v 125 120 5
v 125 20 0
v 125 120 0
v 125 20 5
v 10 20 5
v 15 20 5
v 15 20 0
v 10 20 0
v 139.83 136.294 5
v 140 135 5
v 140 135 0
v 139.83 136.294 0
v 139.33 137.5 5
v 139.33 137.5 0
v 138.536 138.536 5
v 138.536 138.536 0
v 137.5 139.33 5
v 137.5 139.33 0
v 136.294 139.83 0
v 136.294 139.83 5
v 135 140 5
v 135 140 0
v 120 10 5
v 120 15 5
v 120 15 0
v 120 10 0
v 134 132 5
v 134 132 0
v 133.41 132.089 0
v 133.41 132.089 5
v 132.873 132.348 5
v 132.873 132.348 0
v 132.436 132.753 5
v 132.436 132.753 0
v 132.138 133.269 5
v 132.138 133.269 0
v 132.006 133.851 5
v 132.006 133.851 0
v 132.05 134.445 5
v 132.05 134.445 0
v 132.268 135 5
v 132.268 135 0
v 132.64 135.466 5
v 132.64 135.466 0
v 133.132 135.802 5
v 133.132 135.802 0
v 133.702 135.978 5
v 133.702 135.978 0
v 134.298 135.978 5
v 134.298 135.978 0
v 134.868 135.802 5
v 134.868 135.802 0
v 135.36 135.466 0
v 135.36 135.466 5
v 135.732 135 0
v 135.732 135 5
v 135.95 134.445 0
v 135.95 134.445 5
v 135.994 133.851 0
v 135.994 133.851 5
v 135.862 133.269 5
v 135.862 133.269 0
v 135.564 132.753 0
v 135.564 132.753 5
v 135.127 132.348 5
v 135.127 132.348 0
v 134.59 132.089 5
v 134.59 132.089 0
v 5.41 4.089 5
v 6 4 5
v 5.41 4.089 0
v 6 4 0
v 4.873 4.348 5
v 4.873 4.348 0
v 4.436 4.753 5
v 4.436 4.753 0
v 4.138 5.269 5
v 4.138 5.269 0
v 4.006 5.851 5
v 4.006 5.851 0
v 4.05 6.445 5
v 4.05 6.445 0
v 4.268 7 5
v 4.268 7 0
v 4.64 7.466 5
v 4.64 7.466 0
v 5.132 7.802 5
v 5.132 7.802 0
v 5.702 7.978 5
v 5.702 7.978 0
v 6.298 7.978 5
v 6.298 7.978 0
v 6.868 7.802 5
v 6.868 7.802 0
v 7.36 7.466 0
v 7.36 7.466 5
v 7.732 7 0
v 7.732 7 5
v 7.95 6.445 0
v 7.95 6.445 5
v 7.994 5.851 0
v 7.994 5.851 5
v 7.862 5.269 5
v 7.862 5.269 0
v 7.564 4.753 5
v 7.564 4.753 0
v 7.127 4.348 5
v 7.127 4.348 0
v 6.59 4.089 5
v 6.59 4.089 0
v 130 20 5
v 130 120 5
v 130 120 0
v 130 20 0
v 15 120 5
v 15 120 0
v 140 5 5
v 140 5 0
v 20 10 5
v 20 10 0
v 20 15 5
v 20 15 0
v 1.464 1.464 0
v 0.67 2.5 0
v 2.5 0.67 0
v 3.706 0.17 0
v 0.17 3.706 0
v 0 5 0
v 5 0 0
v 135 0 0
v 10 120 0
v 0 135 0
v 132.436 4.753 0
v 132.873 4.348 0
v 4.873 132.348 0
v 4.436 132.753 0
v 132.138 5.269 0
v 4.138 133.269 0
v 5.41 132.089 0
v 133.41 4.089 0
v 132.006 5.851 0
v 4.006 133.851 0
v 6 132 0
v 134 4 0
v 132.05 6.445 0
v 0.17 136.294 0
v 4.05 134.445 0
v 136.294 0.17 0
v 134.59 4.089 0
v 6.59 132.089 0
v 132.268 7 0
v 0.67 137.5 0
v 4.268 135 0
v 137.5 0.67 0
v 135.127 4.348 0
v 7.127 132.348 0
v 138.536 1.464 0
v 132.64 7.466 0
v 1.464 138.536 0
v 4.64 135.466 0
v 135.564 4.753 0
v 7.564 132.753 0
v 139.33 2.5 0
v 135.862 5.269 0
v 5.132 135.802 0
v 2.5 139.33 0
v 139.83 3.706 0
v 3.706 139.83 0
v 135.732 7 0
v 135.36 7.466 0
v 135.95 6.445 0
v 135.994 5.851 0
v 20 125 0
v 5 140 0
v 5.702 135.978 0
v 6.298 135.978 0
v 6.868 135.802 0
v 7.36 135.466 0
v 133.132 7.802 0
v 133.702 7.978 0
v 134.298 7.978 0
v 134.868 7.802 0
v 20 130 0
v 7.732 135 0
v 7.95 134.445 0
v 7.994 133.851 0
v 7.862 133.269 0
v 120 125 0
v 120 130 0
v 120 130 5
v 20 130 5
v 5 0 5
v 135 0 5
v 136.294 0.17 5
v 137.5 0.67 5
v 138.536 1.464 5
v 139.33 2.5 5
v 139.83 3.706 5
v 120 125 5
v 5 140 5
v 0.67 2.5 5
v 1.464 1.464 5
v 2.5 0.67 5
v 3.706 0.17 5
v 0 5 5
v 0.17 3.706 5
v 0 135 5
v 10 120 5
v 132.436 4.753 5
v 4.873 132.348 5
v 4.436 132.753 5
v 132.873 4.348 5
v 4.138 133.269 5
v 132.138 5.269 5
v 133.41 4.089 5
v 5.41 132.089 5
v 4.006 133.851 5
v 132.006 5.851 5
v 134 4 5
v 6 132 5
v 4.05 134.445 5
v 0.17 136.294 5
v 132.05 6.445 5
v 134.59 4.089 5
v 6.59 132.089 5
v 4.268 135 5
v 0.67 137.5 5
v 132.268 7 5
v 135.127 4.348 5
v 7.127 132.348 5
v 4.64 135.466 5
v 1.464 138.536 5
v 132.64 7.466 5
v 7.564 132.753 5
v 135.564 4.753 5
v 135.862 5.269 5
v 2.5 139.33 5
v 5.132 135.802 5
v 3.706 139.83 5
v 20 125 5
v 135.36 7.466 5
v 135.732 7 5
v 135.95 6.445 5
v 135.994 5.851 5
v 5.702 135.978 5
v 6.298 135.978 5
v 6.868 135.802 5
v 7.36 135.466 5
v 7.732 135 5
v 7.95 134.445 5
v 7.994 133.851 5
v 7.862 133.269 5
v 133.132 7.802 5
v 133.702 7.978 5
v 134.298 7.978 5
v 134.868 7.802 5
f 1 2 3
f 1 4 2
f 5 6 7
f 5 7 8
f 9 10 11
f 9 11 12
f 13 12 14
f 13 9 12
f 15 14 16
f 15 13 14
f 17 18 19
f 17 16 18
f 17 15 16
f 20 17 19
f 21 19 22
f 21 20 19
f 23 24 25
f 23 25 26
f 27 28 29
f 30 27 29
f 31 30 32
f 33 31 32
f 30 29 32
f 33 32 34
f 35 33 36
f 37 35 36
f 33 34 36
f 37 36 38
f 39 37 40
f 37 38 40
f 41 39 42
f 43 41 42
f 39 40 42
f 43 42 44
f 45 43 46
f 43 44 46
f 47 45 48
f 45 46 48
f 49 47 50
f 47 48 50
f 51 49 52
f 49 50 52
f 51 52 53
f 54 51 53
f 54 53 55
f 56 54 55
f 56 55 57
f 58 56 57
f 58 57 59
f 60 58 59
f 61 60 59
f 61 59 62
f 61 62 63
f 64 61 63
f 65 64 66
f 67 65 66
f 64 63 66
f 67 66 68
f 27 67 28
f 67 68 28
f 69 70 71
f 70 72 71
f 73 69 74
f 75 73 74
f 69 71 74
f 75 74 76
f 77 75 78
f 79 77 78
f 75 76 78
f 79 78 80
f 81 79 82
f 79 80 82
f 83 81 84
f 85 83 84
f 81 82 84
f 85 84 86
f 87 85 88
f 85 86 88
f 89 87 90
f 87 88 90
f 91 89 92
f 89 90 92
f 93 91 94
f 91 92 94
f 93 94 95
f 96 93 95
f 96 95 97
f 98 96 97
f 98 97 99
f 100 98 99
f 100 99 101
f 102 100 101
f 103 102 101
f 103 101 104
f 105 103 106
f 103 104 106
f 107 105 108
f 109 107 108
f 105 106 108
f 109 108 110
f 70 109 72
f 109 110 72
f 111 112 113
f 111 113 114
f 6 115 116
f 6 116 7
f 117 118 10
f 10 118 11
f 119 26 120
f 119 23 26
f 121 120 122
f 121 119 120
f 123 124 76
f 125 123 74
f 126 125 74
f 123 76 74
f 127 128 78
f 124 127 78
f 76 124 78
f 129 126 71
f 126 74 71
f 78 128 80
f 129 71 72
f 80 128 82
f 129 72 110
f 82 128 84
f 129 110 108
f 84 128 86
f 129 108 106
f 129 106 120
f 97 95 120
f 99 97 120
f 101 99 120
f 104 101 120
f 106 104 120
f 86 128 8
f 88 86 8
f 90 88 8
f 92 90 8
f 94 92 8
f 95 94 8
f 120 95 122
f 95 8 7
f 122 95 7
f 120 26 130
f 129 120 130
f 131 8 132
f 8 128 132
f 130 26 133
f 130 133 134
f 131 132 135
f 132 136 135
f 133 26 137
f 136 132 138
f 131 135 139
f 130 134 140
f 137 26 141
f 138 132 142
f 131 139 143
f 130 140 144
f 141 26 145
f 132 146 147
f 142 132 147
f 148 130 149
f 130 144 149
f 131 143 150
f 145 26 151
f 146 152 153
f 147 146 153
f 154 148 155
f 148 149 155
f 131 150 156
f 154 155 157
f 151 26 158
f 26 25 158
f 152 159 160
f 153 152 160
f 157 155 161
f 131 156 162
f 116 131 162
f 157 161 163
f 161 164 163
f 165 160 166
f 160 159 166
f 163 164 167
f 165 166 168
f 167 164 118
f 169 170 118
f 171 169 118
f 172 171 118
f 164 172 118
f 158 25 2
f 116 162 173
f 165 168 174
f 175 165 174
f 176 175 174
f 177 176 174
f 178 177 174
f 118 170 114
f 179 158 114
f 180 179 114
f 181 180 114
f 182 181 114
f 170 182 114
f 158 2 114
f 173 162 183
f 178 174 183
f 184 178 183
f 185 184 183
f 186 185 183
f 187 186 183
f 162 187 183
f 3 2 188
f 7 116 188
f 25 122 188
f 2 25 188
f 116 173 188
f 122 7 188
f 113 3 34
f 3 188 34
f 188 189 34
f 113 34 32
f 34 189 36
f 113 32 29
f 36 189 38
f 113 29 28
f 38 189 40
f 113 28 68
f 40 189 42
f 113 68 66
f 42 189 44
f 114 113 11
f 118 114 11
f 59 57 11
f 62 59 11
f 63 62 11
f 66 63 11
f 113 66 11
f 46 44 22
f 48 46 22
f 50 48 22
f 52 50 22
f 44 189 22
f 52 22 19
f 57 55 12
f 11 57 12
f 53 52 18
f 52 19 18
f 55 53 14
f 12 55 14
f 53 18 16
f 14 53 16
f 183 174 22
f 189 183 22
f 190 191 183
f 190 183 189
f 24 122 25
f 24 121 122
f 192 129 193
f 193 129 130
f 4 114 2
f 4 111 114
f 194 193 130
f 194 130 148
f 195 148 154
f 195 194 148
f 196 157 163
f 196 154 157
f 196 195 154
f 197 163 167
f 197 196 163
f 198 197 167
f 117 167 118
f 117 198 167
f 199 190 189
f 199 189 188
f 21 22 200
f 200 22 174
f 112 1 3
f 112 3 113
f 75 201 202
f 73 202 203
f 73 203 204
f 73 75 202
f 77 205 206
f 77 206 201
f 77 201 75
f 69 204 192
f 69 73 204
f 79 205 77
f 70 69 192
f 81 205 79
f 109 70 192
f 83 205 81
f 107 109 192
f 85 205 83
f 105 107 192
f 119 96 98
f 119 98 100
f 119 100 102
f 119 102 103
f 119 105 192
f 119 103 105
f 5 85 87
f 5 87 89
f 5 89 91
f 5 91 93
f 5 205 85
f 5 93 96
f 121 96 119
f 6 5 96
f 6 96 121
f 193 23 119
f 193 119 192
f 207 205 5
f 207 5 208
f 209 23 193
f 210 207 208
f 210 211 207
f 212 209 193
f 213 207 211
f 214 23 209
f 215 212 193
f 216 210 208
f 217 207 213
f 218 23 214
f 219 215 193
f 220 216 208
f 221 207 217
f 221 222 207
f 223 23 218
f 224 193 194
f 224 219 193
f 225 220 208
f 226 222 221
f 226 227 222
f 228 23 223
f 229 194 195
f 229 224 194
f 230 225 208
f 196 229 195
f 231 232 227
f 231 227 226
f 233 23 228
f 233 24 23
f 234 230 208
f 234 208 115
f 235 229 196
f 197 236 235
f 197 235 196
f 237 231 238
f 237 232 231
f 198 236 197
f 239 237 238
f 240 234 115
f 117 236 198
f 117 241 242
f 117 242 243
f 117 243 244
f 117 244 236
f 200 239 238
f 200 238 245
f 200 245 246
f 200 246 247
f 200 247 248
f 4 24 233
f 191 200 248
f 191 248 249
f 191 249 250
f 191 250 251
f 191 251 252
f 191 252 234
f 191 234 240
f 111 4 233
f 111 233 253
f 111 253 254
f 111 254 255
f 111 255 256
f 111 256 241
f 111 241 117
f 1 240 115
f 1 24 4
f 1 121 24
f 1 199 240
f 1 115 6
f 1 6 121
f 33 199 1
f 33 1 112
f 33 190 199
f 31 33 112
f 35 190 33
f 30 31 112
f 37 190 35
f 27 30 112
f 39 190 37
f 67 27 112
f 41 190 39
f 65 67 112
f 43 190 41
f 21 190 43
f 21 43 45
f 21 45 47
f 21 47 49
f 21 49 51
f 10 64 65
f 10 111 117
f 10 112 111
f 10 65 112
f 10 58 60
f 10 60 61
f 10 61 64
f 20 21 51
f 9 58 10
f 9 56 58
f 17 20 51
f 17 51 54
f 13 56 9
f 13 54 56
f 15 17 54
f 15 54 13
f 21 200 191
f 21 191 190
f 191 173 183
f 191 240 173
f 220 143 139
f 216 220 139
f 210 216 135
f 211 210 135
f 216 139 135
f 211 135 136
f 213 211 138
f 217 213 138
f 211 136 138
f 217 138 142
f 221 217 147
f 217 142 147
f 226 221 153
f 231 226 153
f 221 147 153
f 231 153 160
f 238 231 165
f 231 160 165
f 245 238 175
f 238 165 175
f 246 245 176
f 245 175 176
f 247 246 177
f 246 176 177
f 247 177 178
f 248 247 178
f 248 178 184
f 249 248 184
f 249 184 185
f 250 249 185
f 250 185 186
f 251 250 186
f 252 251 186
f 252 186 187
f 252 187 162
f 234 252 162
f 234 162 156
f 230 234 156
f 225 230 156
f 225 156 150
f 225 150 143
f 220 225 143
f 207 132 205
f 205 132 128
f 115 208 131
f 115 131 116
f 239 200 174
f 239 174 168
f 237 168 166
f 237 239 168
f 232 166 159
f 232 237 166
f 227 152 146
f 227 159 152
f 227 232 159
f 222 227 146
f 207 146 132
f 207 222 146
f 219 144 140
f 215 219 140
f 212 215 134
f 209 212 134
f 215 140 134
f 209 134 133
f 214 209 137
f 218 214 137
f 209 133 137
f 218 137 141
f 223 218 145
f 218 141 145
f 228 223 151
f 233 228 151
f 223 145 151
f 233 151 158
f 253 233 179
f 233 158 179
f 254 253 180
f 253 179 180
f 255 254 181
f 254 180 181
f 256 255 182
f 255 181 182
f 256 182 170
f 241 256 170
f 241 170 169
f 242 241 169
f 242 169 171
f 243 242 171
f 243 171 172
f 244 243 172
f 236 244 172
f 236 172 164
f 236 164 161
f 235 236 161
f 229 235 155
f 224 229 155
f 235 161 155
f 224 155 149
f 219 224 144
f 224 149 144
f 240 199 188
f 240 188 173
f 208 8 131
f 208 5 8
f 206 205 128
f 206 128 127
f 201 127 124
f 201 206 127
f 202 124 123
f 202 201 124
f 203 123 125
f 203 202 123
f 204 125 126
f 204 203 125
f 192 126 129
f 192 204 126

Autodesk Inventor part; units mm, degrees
ref_plane "YZ Plane" through (0, 0, 0) normal (1, 0, 0) x (0, 1, 0)
ref_plane "XZ Plane" through (0, 0, 0) normal (0, 1, 0) x (-1, 0, 0)
ref_plane "XY Plane" through (0, 0, 0) normal (0, 0, 1) x (1, 0, 0)
sketch "Sketch1" plane through (0, 0, 0) normal (0, 0, 1) x (1, 0, 0)
  line L0 (0, 0) -> (140, 0)
  line L1 (140, 0) -> (140, 140)
  line L2 (140, 140) -> (0, 140)
  line L3 (0, 140) -> (0, 0)
  dimension "d0" = 140
  dimension "d1" = 140
extrude "Extrusion1" add sketch "Sketch1" along normal blind 5
fillet "Fillet1" radius 5 4 edges at (140, 140, 2.5) (140, 0, 2.5) (0, 140, 2.5) (0, 0, 2.5)
sketch "Sketch4" plane through (0, 0, 5) normal (0, 0, 1) x (1, 0, 0)
  line L0 (135, 140) -> (5, 140) projected
  line L1 (0, 135) -> (0, 5) projected
  line L2 (140, 5) -> (140, 135) projected
  line L3 (5, 0) -> (135, 0) projected
  point P0 (0, 0)
  point P1 (6, 134)
  point P2 (134, 134)
  point P3 (6, 6)
  point P4 (134, 6)
  dimension "d30" = 6
  dimension "d31" = 6
  dimension "d32" = 6
  dimension "d33" = 6
  dimension "d34" = 6
  dimension "d35" = 6
  dimension "d36" = 6
  dimension "d37" = 6
hole "Hole2" at (134, 134, 5) at (6, 6, 5) at (134, 6, 5) at (6, 134, 5) direction (0, 0, -1) diameter 4 depth 15
sketch "Sketch5" plane through (0, 0, 5) normal (0, 0, 1) x (1, 0, 0)
  line L0 (20, 130) -> (120, 130)
  line L1 (120, 130) -> (120, 125)
  line L2 (120, 125) -> (20, 125)
  line L3 (20, 125) -> (20, 130)
  line L4 (135, 140) -> (5, 140) projected
  line L5 (140, 5) -> (140, 135) projected
  line L6 (20, 15) -> (120, 15)
  line L7 (120, 15) -> (120, 10)
  line L8 (120, 10) -> (20, 10)
  line L9 (20, 10) -> (20, 15)
  line L10 (5, 0) -> (135, 0) projected
  line L11 (10, 120) -> (15, 120)
  line L12 (15, 120) -> (15, 20)
  line L13 (15, 20) -> (10, 20)
  line L14 (10, 20) -> (10, 120)
  line L15 (0, 135) -> (0, 5) projected
  line L16 (125, 120) -> (130, 120)
  line L17 (130, 120) -> (130, 20)
  line L18 (130, 20) -> (125, 20)
  line L19 (125, 20) -> (125, 120)
  point P0 (0, 0)
  dimension "d45" = 10
  dimension "d46" = 5
  dimension "d47" = 20
  dimension "d48" = 100
  dimension "d49" = 100
  dimension "d50" = 5
  dimension "d51" = 20
  dimension "d52" = 10
  dimension "d53" = 5
  dimension "d54" = 100
  dimension "d55" = 20
  dimension "d56" = 10
  dimension "d57" = 5
  dimension "d58" = 100
  dimension "d59" = 10
  dimension "d60" = 20
extrude "Extrusion4" cut sketch "Sketch5" against normal blind 10
properties part number "Led deksel niet hub"
